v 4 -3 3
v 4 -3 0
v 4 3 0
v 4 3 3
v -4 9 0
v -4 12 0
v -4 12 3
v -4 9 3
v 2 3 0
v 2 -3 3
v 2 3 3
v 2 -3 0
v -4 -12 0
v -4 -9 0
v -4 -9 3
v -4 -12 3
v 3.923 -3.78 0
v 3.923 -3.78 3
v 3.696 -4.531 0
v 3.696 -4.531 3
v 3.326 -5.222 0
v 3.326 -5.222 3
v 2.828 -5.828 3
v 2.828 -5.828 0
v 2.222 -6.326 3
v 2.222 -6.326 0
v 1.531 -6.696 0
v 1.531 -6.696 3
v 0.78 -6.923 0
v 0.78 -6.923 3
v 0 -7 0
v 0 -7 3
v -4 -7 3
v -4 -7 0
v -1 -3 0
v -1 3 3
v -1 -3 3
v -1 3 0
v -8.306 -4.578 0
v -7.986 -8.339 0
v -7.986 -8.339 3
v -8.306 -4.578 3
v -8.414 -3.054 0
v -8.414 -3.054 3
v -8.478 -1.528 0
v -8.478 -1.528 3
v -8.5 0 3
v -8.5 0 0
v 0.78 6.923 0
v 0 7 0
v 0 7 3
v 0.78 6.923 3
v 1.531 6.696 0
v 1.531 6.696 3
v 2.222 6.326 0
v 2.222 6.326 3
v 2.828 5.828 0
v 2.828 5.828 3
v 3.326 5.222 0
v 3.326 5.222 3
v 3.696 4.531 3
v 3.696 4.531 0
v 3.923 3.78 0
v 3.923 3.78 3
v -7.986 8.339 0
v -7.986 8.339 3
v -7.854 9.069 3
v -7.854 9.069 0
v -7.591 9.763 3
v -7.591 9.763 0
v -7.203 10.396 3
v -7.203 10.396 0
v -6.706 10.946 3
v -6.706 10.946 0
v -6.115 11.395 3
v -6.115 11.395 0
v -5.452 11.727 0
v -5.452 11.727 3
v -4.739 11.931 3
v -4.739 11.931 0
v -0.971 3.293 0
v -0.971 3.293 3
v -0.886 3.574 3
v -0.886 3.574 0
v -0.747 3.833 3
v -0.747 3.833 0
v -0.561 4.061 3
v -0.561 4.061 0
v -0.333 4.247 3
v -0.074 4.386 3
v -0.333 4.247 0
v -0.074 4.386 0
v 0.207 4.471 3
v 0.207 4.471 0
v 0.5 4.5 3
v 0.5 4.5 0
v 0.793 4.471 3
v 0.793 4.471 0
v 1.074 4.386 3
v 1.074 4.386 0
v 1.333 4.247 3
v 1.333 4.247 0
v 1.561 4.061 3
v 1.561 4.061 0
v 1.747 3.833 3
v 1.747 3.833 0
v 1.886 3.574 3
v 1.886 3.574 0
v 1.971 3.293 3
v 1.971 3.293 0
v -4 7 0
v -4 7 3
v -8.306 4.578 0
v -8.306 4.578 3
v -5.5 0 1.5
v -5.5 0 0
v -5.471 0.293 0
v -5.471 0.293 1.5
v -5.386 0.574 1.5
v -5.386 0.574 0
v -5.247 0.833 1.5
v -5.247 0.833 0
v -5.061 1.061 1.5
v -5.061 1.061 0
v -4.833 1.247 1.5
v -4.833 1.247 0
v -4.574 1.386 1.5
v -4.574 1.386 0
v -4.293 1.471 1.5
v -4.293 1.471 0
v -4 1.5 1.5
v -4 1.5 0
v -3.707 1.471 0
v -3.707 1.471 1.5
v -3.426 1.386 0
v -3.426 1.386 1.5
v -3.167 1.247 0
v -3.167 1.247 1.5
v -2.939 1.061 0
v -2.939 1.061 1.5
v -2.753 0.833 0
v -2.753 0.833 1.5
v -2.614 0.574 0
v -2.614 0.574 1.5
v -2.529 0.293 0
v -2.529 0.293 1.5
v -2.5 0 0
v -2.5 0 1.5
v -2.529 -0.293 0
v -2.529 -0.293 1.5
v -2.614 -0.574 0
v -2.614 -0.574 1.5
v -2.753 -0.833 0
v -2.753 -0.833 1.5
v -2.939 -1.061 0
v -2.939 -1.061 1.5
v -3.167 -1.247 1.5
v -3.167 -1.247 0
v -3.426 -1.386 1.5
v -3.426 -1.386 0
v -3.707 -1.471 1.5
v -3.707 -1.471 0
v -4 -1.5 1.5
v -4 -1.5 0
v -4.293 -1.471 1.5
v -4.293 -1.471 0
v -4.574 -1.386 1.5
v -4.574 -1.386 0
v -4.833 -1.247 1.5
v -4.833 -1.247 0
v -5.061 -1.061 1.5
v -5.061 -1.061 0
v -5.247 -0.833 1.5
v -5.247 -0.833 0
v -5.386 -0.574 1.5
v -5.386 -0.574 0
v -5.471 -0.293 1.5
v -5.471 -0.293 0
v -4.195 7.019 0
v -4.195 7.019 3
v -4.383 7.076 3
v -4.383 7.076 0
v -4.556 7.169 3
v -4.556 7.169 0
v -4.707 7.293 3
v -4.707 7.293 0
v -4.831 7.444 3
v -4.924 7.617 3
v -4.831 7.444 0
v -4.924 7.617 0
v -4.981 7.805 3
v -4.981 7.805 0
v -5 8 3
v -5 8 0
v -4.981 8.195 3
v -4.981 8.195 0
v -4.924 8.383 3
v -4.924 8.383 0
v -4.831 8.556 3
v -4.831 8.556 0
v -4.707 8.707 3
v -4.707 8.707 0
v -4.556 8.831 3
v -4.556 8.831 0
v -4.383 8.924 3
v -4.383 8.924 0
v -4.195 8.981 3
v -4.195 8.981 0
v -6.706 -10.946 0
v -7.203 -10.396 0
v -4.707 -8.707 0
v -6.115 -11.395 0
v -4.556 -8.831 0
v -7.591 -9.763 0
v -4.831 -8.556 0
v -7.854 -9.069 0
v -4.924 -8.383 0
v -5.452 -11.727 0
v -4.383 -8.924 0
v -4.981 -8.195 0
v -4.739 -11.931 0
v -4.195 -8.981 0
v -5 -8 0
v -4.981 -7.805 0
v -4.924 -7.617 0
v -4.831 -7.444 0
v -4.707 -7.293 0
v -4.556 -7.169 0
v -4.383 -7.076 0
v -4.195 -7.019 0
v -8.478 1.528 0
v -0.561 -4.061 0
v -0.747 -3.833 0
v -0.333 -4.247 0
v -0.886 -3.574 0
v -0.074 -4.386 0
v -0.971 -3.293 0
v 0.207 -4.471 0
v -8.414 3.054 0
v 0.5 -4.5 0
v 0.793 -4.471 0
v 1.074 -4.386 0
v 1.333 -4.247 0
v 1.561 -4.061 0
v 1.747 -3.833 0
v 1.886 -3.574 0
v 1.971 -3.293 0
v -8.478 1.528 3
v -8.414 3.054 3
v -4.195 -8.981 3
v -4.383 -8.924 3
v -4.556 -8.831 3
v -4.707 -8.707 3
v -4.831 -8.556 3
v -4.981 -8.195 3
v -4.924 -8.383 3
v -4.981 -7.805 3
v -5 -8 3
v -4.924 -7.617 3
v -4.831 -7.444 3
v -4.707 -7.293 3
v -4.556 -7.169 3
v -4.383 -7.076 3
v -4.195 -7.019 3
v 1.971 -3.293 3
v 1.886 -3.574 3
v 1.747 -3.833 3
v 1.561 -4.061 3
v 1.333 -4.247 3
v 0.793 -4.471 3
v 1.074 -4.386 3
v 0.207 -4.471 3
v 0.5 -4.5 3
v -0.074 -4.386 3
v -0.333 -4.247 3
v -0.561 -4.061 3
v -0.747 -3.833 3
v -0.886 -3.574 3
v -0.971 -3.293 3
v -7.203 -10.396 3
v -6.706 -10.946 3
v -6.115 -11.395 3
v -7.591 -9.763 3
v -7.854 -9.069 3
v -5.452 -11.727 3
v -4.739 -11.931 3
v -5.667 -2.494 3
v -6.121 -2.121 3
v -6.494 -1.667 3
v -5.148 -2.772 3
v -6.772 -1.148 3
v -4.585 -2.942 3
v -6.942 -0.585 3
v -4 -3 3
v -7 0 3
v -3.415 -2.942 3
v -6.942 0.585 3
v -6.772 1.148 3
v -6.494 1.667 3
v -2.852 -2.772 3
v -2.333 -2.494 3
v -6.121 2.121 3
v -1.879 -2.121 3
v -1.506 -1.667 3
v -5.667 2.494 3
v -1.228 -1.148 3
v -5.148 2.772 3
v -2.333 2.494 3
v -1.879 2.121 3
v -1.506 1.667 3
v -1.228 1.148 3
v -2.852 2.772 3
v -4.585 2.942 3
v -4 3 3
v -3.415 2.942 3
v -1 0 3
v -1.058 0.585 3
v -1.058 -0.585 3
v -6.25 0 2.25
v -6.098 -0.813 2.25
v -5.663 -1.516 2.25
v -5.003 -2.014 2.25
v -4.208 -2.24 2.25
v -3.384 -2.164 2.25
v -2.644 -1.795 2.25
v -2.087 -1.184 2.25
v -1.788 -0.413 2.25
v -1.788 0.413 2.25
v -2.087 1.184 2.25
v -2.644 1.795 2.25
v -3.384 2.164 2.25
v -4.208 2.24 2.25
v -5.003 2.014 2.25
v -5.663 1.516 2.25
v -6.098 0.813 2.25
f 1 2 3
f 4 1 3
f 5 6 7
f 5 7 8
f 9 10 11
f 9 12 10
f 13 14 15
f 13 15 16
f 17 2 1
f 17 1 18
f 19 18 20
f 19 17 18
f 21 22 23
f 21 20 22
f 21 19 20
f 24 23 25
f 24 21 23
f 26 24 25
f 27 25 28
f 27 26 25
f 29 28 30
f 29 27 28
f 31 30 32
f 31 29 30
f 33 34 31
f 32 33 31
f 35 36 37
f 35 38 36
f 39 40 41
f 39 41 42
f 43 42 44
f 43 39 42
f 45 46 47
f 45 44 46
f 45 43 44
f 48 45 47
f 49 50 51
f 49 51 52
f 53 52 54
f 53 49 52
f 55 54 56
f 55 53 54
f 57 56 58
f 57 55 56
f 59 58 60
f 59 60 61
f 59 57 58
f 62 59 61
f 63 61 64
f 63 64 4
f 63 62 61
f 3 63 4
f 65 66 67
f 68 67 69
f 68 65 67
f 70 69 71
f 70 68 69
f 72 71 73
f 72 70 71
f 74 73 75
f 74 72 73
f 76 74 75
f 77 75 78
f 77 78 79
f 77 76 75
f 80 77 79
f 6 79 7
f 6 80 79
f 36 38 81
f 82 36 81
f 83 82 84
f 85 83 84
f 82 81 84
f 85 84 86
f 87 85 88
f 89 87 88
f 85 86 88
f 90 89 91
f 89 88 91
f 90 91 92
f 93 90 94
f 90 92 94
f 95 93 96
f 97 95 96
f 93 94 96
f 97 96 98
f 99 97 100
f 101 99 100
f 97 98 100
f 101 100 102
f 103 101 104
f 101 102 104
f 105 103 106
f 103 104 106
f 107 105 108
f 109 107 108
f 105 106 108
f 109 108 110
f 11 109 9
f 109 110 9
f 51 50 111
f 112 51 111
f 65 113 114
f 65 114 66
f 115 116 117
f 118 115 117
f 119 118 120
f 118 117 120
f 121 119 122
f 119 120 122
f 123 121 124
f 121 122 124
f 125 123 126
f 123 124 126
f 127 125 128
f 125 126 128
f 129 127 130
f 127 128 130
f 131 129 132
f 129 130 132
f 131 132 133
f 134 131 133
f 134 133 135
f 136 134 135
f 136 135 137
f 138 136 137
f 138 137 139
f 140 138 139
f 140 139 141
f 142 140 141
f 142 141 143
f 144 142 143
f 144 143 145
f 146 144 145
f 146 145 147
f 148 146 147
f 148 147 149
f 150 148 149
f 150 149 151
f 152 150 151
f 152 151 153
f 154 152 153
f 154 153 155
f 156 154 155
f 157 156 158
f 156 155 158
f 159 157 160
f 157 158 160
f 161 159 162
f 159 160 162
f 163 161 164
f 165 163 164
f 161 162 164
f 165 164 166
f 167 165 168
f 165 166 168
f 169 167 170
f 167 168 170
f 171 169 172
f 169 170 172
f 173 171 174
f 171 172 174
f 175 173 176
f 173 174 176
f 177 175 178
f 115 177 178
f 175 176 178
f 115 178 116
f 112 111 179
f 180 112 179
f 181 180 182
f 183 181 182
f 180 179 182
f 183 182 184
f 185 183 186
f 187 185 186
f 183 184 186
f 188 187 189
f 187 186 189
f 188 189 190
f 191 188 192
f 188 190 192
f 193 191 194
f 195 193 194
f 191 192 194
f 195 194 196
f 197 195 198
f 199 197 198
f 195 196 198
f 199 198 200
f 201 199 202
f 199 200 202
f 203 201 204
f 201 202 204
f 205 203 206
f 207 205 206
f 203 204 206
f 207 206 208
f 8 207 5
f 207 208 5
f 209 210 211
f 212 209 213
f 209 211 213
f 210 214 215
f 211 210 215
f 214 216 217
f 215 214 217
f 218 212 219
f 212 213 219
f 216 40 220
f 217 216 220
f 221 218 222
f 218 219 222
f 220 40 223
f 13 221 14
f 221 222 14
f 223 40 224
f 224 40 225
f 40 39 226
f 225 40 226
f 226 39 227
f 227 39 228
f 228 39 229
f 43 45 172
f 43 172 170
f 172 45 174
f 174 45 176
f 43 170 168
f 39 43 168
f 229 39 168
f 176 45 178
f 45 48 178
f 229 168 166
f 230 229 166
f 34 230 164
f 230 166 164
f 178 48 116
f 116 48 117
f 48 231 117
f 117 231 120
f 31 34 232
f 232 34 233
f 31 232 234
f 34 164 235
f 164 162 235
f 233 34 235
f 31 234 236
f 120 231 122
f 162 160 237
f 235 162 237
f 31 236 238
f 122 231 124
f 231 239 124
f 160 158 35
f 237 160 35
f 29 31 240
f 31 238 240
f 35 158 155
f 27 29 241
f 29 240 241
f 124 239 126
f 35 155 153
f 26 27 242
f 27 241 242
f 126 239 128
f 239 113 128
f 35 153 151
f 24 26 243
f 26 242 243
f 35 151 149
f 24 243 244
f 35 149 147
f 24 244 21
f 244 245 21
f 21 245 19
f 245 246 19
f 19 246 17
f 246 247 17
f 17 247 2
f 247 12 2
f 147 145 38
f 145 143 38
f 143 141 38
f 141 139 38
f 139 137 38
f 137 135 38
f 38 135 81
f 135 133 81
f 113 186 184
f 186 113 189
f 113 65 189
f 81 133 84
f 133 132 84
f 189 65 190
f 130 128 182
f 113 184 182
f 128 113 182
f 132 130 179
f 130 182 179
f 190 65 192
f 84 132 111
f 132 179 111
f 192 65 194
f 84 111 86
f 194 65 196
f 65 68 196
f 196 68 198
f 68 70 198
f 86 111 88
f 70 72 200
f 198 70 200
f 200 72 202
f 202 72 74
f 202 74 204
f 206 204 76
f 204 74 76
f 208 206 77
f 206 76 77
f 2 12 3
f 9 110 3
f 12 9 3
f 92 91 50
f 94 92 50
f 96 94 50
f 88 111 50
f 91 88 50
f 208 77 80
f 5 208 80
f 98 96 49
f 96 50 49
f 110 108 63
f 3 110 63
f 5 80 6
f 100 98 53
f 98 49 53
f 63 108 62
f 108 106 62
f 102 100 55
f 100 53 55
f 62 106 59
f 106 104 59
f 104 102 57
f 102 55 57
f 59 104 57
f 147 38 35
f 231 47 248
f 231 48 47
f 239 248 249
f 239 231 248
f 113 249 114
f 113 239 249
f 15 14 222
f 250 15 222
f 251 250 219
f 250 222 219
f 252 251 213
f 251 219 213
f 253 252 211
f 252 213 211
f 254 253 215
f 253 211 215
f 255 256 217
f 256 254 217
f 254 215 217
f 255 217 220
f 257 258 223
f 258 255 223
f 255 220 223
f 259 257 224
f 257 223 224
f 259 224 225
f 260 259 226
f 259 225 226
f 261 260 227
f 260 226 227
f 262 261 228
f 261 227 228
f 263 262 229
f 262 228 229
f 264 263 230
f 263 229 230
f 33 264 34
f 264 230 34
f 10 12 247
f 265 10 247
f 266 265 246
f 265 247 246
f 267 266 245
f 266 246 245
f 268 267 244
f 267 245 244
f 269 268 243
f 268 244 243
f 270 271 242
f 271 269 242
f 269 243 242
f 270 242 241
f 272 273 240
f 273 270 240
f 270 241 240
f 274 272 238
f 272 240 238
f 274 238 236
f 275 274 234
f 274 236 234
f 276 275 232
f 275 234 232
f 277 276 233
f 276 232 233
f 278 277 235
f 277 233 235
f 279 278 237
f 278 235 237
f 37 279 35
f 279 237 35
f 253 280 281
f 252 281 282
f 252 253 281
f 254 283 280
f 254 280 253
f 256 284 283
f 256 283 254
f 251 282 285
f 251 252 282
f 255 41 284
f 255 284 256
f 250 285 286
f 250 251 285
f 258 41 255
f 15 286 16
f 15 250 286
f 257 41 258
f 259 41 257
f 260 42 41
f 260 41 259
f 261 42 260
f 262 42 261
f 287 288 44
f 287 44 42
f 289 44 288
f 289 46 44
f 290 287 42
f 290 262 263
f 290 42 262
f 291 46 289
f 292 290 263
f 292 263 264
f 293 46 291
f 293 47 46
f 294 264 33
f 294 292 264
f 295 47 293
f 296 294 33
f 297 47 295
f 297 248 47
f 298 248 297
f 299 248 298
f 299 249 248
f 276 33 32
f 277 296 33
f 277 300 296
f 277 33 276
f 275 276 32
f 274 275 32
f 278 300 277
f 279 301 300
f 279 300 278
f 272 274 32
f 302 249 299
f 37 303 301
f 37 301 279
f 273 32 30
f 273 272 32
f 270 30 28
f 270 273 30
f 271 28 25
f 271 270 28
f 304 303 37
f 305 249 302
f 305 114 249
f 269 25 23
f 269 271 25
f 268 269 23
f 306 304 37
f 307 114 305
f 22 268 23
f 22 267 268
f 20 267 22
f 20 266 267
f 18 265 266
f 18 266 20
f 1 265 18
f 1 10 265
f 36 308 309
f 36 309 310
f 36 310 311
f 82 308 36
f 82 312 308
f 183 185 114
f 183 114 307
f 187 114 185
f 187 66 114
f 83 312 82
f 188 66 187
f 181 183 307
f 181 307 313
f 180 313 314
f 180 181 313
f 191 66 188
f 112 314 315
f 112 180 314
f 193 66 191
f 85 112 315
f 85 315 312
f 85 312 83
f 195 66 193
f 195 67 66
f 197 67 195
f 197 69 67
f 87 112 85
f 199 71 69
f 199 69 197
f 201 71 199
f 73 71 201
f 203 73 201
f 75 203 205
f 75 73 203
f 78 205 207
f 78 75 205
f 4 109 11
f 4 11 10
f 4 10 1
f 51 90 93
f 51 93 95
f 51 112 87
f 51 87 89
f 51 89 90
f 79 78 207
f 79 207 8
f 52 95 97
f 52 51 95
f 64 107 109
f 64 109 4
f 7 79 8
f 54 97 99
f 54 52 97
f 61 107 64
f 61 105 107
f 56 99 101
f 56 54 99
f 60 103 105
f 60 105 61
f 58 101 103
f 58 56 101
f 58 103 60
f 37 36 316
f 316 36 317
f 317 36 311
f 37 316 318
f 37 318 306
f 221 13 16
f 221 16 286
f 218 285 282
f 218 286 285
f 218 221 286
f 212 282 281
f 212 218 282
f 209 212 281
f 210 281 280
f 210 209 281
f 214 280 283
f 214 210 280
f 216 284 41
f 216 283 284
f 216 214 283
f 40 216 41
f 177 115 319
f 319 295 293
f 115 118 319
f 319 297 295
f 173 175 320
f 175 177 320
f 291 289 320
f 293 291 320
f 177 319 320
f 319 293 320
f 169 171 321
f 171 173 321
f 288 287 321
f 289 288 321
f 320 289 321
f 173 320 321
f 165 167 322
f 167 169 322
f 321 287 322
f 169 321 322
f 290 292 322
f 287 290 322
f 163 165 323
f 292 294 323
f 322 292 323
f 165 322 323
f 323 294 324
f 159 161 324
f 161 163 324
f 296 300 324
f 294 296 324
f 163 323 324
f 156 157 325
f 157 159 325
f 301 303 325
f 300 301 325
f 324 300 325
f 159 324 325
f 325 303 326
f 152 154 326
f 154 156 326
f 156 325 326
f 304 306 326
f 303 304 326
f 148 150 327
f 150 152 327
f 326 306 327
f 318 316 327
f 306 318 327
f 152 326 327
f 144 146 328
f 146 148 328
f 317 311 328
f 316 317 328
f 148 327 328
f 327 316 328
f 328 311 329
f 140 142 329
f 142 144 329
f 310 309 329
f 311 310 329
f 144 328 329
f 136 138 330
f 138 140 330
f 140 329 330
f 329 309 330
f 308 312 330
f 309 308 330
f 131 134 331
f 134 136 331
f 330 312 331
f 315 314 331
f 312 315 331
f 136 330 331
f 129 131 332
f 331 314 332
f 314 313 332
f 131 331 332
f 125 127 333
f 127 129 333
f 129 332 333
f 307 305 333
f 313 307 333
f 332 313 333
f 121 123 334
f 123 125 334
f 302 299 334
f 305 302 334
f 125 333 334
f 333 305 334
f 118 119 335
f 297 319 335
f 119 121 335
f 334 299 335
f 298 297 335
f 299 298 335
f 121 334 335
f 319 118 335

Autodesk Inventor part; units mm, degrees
ref_plane "YZ Plane" through (0, 0, 0) normal (1, 0, 0) x (0, 1, 0)
ref_plane "XZ Plane" through (0, 0, 0) normal (0, 1, 0) x (-1, 0, 0)
ref_plane "XY Plane" through (0, 0, 0) normal (0, 0, 1) x (1, 0, 0)
sketch "スケッチ1" plane through (0, 0, 0) normal (0, 0, 1) x (1, 0, 0)
  line L0 (-4, -7) -> (0, -7)
  line L1 (4, -3) -> (4, 0)
  arc A0 (-4, -7) -> (-4, -9) centre (-4, -8) ccw
  line L2 (-4, -9) -> (-4, -12)
  arc A1 (-5.5, 0) -> (-2.5, 0) centre (-4, 0) ccw
  arc A2 (-7.9856, -8.3391) -> (-4, -12) centre (-4, -8) ccw
  line L3 (-7.9856, -8.3391) -> (-8.3056, -4.5778)
  line L4 (-8.5, 0) -> (-5.5, 0)
  line L5 (-1, 0) -> (-1, -3)
  line L6 (2, -3) -> (2, 0)
  line L7 (-2.5, 0) -> (-1, 0)
  line L8 (2, 0) -> (4, 0)
  arc A3 (-1, -3) -> (2, -3) centre (0.5, -3) ccw
  circle A4 centre (-4, 0) radius 5 construction
  line L9 (-9, 0) -> (-9, -7) construction
  arc A5 (-8.5, 0) -> (-8.3056, -4.5778) centre (45.5, 0) ccw
  circle A6 centre (-4, 0) radius 3 construction
  arc A7 (0, -7) -> (4, -3) centre (0, -3) ccw
  point P0 (0, 0)
  point P1 (0, 0)
  point P2 (0, 0)
  dimension "d14" = 10
  dimension "d17" = 6
  dimension "d3" = 1
  dimension "d4" = 3
  dimension "d6" = 3
  dimension "d8" = 4
  dimension "d11" = 3
  dimension "d13" = 2
  dimension "d15" = 5
  dimension "d16" = 54
  dimension "d31" = 4
  dimension "d32" = 7
  dimension "d41" = 4
  dimension "d42" = 4
  dimension "d43" = 4
  dimension "d46" = 1.5
  dimension "d47" = 3
  dimension "d48" = 3
  dimension "d53" = 0
extrude "押し出し1" add sketch "スケッチ1" along normal blind 3
mirror "ミラー1" about plane through (-1, 0, 0) normal (0, 1, 0) of "押し出し1"
chamfer "面取り1" distance 1.5 angle 45 1 edges at (-4, -1.5, 3)
properties part number "ShaftBase2"
